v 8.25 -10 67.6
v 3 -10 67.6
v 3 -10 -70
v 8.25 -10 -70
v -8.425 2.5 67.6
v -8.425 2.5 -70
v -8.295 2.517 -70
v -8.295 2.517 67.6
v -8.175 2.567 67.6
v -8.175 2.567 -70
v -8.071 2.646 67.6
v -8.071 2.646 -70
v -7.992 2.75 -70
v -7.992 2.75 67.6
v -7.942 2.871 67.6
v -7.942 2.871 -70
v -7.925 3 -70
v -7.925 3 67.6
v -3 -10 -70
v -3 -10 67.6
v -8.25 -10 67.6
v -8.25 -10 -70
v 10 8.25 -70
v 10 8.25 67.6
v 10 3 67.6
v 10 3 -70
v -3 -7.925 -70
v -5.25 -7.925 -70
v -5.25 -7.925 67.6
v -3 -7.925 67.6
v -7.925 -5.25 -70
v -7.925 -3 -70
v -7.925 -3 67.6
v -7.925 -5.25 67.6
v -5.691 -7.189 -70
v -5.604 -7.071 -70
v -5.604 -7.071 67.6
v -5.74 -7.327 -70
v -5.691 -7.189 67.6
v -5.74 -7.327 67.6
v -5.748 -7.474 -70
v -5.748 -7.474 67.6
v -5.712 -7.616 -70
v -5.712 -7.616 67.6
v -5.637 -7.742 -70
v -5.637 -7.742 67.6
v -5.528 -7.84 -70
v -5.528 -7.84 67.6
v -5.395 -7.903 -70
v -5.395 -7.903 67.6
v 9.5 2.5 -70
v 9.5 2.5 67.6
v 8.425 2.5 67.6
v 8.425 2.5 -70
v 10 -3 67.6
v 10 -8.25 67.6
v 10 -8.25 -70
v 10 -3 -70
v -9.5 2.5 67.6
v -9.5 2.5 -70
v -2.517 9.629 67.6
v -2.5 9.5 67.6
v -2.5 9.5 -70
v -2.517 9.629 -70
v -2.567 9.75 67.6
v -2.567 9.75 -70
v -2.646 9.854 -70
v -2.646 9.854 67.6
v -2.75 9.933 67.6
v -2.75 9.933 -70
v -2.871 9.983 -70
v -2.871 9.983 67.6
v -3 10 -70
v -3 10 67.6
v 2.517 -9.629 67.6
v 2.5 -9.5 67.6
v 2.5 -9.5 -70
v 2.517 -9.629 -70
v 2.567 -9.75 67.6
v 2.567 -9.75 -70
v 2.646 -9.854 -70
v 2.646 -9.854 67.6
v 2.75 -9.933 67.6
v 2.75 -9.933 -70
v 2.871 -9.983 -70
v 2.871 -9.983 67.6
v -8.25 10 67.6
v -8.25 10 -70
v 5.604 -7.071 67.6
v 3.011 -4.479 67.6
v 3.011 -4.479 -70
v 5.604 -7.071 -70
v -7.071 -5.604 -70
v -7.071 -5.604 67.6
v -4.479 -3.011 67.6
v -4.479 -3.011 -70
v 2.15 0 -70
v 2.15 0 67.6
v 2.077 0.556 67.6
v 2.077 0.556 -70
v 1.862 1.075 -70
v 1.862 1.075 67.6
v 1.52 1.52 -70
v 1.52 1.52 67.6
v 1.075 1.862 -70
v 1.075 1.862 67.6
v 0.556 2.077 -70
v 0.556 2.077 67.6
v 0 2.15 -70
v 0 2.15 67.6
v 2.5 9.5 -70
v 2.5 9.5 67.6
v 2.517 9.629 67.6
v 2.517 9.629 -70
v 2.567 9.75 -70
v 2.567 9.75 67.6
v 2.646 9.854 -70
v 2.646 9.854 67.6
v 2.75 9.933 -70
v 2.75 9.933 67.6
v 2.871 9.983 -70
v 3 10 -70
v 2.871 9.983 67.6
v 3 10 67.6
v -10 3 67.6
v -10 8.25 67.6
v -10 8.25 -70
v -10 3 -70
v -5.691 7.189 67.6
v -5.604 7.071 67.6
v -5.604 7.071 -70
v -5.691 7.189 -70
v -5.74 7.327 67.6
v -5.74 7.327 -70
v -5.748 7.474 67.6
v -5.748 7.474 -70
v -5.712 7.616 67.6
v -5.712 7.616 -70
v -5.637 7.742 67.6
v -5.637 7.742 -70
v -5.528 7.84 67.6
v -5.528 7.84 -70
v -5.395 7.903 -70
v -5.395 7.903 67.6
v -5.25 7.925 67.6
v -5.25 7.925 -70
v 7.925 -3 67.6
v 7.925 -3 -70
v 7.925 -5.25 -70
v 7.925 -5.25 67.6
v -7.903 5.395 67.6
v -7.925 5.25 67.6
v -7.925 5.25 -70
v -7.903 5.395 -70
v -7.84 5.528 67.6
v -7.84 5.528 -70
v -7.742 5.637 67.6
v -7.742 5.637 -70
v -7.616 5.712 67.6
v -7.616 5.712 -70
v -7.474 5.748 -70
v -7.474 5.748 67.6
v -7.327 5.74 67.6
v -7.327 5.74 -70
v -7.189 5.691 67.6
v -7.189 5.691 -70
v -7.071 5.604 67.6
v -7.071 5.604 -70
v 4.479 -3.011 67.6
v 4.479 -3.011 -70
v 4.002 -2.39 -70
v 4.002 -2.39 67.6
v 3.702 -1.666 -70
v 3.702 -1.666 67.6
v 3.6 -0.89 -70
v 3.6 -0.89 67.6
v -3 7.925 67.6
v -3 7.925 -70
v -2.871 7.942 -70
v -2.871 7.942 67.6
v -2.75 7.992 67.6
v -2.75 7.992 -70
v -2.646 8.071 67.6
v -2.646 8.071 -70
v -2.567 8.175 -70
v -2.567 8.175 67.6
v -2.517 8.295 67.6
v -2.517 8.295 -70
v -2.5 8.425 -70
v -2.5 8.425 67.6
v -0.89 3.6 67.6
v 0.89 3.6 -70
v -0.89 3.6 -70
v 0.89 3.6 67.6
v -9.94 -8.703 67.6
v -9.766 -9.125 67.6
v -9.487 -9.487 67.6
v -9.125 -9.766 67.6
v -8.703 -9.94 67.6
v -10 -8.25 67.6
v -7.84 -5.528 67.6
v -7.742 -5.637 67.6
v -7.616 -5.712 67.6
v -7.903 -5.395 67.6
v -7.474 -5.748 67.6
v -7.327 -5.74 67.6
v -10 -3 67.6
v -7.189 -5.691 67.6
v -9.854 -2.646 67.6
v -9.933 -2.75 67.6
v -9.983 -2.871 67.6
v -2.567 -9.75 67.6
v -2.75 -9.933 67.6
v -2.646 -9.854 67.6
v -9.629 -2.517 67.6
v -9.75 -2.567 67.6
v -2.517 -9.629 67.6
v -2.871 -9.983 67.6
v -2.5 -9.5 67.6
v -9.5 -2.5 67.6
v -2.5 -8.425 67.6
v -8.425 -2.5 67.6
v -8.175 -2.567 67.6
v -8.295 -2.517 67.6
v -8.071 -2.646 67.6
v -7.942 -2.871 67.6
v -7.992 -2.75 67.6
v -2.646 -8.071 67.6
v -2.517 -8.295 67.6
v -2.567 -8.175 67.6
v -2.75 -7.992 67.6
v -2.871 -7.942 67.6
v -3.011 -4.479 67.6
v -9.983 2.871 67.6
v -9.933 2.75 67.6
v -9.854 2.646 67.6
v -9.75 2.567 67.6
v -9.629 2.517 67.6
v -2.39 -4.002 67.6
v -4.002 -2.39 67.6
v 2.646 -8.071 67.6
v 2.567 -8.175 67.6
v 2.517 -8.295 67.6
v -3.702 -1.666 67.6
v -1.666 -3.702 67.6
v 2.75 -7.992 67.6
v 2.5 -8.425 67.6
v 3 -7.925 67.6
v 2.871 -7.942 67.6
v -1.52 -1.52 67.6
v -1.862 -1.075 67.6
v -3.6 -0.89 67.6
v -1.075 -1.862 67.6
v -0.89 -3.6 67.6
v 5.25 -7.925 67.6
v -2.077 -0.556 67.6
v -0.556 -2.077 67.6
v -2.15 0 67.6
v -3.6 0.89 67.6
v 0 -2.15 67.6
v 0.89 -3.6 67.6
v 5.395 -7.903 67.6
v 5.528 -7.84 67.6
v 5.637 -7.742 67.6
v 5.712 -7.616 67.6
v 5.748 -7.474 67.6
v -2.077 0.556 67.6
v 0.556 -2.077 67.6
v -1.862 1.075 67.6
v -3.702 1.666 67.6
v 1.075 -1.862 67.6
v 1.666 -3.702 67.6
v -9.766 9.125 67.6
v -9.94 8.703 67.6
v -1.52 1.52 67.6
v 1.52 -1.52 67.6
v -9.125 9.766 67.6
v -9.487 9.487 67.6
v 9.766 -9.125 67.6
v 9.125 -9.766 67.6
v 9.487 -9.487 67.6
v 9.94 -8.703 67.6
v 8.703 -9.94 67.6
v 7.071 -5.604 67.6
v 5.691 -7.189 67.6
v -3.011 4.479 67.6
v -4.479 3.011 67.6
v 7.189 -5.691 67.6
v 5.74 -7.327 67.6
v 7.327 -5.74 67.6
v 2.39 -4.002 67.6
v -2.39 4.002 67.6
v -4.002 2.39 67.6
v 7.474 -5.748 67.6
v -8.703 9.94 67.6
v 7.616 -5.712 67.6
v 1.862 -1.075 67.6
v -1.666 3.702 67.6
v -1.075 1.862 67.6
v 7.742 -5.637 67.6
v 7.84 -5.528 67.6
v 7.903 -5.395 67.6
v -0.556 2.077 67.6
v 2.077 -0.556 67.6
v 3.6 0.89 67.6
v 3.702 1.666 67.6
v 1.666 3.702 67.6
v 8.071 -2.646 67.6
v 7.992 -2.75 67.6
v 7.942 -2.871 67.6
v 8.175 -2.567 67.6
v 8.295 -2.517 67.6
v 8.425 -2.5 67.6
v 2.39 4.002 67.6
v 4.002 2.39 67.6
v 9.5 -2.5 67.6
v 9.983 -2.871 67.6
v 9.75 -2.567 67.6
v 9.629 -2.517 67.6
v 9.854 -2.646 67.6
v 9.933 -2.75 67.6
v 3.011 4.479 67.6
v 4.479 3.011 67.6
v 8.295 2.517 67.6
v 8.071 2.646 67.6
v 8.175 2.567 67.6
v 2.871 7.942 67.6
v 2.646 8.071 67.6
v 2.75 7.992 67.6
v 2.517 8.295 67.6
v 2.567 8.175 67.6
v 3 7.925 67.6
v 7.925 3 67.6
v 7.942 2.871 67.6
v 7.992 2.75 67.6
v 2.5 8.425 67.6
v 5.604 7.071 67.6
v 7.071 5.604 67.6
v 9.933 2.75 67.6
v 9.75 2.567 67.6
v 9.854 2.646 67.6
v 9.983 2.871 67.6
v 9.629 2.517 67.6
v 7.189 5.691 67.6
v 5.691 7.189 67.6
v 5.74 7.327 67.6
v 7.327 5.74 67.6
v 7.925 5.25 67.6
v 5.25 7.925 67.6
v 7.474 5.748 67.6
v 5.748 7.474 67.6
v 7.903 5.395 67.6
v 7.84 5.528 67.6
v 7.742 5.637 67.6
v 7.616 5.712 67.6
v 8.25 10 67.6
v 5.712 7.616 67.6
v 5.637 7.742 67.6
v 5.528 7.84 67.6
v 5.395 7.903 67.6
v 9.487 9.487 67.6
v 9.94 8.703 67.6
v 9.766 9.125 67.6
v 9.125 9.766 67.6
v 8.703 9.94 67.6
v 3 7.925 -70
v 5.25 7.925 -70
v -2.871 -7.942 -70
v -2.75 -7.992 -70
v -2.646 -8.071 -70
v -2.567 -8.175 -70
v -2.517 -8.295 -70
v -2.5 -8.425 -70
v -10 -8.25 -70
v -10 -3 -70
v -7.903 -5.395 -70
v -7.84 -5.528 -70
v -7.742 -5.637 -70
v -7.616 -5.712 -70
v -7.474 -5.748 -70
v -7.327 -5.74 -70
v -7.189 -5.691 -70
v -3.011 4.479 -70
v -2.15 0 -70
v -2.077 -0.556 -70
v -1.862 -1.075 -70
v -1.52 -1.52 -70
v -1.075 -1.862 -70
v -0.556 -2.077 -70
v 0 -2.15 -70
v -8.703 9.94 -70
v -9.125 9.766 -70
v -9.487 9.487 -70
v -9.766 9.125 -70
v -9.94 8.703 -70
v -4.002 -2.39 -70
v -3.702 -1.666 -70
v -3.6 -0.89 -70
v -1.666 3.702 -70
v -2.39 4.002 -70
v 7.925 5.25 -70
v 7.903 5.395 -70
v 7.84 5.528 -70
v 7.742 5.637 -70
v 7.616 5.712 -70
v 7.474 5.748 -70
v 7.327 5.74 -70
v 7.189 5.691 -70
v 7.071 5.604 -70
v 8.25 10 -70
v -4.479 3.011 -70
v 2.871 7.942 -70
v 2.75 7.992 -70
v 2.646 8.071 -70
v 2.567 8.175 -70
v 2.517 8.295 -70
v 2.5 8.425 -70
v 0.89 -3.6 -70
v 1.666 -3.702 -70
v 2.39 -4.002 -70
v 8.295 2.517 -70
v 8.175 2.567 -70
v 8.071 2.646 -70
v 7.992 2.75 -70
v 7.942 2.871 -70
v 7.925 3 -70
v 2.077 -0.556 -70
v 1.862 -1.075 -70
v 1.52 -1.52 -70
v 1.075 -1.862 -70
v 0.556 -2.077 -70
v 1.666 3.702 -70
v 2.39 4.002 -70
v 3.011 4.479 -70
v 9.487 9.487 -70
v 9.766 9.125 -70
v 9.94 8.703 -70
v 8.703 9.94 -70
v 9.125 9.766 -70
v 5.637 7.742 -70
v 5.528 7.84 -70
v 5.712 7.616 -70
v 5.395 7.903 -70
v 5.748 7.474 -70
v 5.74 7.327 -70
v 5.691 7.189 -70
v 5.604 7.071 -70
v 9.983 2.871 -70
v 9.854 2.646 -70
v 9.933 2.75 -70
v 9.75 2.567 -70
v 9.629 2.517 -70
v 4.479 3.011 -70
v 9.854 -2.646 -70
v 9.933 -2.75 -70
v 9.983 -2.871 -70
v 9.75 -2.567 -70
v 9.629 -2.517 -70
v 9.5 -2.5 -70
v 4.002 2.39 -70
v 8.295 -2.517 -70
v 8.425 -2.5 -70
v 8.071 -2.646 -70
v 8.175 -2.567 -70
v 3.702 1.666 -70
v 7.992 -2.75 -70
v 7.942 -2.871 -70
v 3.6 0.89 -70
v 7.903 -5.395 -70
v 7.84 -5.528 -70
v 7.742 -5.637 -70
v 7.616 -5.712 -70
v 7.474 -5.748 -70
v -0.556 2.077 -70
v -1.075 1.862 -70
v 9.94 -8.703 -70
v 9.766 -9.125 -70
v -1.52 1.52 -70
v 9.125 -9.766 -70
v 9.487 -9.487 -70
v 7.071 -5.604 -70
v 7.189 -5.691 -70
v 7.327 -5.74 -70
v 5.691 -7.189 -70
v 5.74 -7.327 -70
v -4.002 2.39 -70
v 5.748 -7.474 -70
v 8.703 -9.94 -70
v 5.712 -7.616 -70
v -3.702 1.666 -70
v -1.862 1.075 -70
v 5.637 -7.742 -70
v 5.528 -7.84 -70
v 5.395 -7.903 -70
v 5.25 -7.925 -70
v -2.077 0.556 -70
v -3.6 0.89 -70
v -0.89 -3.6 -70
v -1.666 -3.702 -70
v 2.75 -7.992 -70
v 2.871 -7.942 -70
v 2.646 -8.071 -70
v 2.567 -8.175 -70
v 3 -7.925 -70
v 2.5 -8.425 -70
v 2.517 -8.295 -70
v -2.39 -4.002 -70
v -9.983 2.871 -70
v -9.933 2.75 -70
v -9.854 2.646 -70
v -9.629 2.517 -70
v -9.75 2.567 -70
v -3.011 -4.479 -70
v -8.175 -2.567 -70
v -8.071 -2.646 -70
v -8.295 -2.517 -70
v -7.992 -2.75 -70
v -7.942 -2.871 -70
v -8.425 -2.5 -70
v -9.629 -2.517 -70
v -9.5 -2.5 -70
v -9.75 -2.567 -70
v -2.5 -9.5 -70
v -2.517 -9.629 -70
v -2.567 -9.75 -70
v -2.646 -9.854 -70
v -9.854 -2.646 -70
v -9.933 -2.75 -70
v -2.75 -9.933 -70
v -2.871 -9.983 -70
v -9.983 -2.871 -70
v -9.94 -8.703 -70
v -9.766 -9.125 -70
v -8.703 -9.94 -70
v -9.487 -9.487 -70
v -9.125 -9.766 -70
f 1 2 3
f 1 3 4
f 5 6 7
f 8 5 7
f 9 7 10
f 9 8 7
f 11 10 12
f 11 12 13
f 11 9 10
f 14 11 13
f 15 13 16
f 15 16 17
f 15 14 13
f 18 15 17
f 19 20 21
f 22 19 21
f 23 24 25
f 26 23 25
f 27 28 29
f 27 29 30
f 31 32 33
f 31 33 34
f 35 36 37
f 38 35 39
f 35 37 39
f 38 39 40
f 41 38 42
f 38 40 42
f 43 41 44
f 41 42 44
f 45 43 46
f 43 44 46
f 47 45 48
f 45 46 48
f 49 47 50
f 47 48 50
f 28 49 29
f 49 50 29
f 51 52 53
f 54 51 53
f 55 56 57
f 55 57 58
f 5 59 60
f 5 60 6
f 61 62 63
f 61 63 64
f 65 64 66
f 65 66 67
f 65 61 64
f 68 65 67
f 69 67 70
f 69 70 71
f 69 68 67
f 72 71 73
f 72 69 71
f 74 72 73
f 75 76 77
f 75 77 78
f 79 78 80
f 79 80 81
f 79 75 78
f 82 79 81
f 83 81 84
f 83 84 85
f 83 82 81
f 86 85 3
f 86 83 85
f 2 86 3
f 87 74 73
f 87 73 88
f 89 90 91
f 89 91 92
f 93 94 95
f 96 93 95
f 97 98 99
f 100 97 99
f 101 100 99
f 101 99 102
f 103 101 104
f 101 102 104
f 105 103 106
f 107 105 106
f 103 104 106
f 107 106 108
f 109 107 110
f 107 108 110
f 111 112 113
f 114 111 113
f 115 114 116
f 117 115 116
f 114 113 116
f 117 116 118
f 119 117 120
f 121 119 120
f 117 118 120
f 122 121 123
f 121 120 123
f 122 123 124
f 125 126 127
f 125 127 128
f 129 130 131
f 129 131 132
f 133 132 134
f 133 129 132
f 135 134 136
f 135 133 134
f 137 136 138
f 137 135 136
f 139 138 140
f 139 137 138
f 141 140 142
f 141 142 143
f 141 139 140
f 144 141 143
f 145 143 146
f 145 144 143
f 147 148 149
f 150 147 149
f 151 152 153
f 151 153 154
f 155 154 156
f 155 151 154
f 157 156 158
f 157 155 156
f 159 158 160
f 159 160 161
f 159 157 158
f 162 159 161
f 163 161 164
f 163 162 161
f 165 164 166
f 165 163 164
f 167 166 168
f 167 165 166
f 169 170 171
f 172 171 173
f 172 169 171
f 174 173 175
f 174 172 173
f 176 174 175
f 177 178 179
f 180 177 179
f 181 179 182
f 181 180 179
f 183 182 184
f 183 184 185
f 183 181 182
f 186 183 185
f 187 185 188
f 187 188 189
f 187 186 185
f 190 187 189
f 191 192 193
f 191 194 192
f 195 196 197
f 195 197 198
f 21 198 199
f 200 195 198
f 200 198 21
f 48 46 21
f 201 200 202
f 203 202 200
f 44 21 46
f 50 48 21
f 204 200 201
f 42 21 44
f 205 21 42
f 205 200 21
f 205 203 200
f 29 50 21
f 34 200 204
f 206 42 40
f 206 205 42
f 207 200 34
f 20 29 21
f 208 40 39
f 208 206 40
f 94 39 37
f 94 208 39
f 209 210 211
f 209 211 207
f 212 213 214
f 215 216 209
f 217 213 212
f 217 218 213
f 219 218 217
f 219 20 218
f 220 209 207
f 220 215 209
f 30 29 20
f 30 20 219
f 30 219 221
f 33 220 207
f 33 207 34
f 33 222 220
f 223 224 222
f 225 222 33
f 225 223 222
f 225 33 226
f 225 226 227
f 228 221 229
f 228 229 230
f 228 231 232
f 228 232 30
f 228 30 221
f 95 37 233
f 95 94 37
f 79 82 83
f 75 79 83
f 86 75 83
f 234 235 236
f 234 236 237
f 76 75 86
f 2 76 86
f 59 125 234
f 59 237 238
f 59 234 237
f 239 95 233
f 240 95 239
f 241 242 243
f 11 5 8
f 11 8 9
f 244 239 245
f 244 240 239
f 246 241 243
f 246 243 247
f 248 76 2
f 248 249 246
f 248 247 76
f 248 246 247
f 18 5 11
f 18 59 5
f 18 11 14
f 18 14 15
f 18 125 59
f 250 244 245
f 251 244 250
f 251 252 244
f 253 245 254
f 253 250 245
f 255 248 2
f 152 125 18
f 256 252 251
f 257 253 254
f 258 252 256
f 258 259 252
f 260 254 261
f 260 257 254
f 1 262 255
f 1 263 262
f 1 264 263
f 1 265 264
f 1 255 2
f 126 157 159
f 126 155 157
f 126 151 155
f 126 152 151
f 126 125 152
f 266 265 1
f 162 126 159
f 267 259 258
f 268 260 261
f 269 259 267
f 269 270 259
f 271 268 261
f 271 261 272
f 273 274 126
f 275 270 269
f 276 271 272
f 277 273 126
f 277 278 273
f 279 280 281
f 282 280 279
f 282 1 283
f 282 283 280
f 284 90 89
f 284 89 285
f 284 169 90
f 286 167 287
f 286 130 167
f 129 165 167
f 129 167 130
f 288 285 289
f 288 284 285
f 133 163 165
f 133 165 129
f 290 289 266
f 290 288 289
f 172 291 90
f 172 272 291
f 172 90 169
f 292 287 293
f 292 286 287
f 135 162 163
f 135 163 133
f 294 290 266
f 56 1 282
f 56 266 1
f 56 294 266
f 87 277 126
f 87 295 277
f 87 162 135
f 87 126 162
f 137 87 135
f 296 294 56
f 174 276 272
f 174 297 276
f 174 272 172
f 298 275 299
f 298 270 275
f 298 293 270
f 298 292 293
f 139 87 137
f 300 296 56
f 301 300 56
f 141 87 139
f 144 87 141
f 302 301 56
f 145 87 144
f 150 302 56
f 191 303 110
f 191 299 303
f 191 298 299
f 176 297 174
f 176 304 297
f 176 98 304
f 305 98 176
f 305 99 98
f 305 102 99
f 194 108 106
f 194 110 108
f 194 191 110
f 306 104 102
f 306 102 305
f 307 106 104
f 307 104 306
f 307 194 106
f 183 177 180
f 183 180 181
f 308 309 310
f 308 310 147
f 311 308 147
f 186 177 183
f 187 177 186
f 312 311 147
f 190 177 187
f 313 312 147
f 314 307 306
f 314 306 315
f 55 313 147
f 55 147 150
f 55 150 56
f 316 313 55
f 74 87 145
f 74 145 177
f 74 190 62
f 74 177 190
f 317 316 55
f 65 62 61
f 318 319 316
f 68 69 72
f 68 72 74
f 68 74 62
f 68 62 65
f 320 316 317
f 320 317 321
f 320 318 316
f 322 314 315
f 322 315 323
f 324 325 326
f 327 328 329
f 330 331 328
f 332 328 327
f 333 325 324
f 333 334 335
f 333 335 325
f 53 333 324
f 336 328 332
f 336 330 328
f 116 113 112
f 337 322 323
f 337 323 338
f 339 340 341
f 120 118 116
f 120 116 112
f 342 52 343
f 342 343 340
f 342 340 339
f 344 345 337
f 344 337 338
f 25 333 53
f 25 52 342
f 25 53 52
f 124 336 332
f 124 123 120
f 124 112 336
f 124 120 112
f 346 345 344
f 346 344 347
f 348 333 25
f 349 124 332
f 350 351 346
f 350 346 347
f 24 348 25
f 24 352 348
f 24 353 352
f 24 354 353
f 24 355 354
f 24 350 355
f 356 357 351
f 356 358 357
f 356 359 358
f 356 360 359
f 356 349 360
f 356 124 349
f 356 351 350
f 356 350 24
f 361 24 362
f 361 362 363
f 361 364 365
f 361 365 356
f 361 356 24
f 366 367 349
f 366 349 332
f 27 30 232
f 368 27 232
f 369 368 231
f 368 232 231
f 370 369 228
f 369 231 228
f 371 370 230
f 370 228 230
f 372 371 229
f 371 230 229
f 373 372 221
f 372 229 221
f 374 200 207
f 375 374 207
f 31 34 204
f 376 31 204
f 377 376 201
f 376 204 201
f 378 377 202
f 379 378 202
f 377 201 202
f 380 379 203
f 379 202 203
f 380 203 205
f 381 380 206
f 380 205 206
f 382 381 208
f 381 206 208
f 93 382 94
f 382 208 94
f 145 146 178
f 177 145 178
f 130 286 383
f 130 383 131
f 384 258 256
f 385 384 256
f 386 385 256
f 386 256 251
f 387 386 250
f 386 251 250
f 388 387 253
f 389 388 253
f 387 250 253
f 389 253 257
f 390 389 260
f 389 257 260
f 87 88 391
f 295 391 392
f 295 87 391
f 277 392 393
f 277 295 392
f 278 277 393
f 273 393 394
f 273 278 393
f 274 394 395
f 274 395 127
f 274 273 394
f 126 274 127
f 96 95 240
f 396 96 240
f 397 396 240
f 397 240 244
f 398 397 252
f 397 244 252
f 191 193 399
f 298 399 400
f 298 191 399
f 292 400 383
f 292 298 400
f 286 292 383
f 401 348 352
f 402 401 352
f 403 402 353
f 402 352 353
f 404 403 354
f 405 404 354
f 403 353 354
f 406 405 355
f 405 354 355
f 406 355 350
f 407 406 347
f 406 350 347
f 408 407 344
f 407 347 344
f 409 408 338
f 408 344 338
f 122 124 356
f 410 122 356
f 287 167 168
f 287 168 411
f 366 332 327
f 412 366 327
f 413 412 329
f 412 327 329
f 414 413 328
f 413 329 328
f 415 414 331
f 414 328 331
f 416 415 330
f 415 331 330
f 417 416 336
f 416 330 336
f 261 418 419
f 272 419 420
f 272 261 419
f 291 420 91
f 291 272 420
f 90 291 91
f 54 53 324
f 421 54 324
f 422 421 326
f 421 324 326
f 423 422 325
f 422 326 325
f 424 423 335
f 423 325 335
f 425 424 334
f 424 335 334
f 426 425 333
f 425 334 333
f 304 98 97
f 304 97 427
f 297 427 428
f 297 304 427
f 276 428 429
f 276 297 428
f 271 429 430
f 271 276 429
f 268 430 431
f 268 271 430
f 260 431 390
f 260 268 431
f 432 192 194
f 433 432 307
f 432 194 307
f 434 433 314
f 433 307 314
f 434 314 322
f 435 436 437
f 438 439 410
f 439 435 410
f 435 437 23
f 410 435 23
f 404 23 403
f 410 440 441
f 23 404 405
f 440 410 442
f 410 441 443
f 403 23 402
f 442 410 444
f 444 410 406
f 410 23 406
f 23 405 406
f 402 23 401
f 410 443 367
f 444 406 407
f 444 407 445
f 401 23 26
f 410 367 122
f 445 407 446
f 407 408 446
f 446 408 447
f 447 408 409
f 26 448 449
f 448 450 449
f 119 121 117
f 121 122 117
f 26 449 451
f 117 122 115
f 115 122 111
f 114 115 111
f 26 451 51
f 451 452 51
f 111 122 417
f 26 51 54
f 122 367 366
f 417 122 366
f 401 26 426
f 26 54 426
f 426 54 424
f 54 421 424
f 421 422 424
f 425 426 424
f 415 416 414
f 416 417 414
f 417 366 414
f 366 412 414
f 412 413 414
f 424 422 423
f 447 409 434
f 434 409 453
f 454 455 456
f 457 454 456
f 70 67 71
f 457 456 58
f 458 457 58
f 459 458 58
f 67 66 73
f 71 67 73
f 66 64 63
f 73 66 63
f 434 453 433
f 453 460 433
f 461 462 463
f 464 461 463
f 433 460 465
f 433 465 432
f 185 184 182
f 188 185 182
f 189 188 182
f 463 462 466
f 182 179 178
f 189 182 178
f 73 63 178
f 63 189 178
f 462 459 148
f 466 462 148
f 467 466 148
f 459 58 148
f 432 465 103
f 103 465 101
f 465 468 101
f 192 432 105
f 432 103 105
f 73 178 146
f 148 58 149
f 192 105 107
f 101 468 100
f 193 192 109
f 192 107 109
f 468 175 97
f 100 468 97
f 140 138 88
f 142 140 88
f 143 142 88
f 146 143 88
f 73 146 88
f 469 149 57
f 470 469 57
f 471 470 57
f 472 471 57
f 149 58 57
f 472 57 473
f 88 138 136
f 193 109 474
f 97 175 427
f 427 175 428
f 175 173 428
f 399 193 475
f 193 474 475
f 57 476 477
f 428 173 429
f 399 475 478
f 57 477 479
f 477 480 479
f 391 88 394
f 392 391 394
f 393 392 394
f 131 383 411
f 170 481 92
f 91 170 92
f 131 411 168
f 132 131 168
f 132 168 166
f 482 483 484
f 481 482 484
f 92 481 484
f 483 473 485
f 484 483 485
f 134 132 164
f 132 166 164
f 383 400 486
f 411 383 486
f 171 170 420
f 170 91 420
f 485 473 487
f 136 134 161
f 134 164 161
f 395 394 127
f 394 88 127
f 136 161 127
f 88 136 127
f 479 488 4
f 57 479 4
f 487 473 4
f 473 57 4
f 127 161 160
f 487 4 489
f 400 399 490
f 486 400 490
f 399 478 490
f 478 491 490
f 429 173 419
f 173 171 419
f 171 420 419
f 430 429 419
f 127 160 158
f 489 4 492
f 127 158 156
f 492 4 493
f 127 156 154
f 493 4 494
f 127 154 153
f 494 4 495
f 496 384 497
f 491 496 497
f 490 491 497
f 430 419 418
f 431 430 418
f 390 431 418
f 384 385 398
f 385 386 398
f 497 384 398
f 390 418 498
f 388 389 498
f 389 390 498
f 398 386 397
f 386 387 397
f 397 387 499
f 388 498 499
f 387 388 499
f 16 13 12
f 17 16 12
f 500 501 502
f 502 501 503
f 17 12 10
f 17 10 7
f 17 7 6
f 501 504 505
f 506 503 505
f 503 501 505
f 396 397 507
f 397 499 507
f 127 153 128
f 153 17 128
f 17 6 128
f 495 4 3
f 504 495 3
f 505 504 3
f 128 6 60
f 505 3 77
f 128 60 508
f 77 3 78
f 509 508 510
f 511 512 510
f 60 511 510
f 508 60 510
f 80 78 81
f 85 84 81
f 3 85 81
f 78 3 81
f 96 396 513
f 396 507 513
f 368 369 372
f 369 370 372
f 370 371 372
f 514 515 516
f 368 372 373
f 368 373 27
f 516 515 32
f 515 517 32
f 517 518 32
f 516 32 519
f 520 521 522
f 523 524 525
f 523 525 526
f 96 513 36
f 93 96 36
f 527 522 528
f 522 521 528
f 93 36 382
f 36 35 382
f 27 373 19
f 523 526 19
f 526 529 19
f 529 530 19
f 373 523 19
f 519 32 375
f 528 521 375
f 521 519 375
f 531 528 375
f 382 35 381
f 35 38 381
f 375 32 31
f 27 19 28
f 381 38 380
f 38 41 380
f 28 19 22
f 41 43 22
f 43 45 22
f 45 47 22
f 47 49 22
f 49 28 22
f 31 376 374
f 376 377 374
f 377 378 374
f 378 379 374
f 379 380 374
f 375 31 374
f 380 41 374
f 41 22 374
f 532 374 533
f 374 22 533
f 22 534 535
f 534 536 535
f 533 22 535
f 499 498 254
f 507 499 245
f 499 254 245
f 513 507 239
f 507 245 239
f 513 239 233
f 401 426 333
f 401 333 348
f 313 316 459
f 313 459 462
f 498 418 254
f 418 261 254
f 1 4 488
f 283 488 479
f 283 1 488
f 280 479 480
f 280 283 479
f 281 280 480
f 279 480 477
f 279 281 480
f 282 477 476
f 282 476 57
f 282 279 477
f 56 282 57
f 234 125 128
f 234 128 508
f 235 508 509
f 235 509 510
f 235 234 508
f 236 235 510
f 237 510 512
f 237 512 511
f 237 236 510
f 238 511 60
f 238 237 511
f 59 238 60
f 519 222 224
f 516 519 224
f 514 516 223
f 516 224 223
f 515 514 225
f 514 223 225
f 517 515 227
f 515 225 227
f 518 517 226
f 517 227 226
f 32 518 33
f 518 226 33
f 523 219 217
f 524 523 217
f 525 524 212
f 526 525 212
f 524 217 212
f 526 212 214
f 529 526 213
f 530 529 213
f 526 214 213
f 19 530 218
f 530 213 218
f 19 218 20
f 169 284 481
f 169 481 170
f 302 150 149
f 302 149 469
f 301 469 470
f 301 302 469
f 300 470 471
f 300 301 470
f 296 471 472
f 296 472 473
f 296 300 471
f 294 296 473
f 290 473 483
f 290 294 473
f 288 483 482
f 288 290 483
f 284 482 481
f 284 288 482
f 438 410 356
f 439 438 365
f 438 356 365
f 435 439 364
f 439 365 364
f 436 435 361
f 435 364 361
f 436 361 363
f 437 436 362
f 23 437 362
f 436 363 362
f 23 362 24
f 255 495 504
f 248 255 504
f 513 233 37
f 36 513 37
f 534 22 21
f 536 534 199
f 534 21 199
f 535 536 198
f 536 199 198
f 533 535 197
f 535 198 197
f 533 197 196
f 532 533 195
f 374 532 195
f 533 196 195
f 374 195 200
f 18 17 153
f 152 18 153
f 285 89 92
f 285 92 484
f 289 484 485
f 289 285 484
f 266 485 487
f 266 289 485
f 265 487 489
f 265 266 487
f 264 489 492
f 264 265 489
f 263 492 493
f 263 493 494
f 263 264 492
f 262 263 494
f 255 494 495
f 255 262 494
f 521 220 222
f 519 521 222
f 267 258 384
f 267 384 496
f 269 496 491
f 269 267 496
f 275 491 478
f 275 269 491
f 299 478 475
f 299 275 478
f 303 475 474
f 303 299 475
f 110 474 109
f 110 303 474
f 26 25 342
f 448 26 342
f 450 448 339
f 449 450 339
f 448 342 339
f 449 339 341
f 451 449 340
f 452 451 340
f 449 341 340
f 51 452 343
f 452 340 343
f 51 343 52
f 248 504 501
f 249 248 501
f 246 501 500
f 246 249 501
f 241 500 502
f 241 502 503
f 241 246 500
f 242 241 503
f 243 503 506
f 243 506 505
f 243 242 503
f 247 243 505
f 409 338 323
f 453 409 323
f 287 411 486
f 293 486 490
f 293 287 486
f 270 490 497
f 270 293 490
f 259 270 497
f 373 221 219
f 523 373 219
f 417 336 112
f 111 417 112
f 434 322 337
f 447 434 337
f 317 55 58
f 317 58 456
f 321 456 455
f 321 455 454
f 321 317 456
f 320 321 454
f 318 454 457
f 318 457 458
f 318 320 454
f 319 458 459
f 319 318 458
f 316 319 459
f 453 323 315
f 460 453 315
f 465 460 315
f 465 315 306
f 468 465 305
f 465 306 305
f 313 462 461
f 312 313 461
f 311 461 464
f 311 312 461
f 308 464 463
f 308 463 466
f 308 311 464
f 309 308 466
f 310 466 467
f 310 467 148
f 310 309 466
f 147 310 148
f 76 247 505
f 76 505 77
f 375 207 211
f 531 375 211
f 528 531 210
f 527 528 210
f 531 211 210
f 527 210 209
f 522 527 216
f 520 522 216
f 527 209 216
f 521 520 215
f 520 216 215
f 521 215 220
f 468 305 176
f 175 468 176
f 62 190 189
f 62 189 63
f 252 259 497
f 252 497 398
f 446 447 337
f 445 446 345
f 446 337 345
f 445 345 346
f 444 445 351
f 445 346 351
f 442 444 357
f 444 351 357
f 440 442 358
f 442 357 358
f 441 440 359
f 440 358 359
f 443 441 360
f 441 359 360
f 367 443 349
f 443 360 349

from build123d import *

# Parameters (mm, degrees)
BOSS_EXTRUDE1_DEPTH = 70
SKETCH5_W           = 27.787302718
SKETCH5_H           = 26.03929452
CUT_EXTRUDE1_DEPTH  = 2.4


with BuildPart() as part:
    # Sketch4 → Boss-Extrude1 (new, symmetric)
    with BuildSketch(Plane.XY):
        with BuildLine():
            Line((3, -10), (8.25, -10))
            ThreePointArc((8.25, -10), (9.487436867, -9.487436867), (10, -8.25))
            Line((10, -8.25), (10, -3))
            ThreePointArc((10, -3), (9.853553391, -2.646446609), (9.5, -2.5))
            Line((9.5, -2.5), (8.424621202, -2.5))
            ThreePointArc((8.424621202, -2.5), (8.071067812, -2.646446609), (7.924621202, -3))
            Line((7.924621202, -3), (7.924621202, -5.25))
            ThreePointArc((7.924621202, -5.25), (7.615962919, -5.711939766), (7.071067812, -5.603553391))
            Line((7.071067812, -5.603553391), (4.478679656, -3.011165235))
            ThreePointArc((4.478679656, -3.011165235), (3.828361402, -2.037895189), (3.6, -0.889844892))
            Line((3.6, -0.889844892), (3.6, 0))
            Line((3.6, 0), (2.15, 0))
            ThreePointArc((2.15, 0), (1.52027958, -1.52027958), (0, -2.15))
            Line((0, -2.15), (0, -3.6))
            Line((0, -3.6), (0.889844892, -3.6))
            ThreePointArc((0.889844892, -3.6), (2.037895189, -3.828361402), (3.011165235, -4.478679656))
            Line((3.011165235, -4.478679656), (5.603553391, -7.071067812))
            ThreePointArc((5.603553391, -7.071067812), (5.711939766, -7.615962919), (5.25, -7.924621202))
            Line((5.25, -7.924621202), (3, -7.924621202))
            ThreePointArc((3, -7.924621202), (2.646446609, -8.071067812), (2.5, -8.424621202))
            Line((2.5, -8.424621202), (2.5, -9.5))
            ThreePointArc((2.5, -9.5), (2.646446609, -9.853553391), (3, -10))
        make_face()
    extrude(amount=BOSS_EXTRUDE1_DEPTH, both=True)

    # Mirror1: part across plane


with BuildPart() as part_1:
    add(part.part)
    add(part.part.mirror(Plane(origin=(0, 0, 0), x_dir=(0, 0, 1), z_dir=(1, 0, 0))))

    # Mirror2: part across plane


with BuildPart() as part_2:
    add(part_1.part)
    add(part_1.part.mirror(Plane.ZX))

    # Sketch5 → Cut-Extrude1 (cut)
    with BuildSketch(Plane.XY.offset(70)):
        with Locations((-0.060276145, -0.663037592)):
            Rectangle(SKETCH5_W, SKETCH5_H)
    extrude(amount=-CUT_EXTRUDE1_DEPTH, mode=Mode.SUBTRACT)


solid = part_2.part
